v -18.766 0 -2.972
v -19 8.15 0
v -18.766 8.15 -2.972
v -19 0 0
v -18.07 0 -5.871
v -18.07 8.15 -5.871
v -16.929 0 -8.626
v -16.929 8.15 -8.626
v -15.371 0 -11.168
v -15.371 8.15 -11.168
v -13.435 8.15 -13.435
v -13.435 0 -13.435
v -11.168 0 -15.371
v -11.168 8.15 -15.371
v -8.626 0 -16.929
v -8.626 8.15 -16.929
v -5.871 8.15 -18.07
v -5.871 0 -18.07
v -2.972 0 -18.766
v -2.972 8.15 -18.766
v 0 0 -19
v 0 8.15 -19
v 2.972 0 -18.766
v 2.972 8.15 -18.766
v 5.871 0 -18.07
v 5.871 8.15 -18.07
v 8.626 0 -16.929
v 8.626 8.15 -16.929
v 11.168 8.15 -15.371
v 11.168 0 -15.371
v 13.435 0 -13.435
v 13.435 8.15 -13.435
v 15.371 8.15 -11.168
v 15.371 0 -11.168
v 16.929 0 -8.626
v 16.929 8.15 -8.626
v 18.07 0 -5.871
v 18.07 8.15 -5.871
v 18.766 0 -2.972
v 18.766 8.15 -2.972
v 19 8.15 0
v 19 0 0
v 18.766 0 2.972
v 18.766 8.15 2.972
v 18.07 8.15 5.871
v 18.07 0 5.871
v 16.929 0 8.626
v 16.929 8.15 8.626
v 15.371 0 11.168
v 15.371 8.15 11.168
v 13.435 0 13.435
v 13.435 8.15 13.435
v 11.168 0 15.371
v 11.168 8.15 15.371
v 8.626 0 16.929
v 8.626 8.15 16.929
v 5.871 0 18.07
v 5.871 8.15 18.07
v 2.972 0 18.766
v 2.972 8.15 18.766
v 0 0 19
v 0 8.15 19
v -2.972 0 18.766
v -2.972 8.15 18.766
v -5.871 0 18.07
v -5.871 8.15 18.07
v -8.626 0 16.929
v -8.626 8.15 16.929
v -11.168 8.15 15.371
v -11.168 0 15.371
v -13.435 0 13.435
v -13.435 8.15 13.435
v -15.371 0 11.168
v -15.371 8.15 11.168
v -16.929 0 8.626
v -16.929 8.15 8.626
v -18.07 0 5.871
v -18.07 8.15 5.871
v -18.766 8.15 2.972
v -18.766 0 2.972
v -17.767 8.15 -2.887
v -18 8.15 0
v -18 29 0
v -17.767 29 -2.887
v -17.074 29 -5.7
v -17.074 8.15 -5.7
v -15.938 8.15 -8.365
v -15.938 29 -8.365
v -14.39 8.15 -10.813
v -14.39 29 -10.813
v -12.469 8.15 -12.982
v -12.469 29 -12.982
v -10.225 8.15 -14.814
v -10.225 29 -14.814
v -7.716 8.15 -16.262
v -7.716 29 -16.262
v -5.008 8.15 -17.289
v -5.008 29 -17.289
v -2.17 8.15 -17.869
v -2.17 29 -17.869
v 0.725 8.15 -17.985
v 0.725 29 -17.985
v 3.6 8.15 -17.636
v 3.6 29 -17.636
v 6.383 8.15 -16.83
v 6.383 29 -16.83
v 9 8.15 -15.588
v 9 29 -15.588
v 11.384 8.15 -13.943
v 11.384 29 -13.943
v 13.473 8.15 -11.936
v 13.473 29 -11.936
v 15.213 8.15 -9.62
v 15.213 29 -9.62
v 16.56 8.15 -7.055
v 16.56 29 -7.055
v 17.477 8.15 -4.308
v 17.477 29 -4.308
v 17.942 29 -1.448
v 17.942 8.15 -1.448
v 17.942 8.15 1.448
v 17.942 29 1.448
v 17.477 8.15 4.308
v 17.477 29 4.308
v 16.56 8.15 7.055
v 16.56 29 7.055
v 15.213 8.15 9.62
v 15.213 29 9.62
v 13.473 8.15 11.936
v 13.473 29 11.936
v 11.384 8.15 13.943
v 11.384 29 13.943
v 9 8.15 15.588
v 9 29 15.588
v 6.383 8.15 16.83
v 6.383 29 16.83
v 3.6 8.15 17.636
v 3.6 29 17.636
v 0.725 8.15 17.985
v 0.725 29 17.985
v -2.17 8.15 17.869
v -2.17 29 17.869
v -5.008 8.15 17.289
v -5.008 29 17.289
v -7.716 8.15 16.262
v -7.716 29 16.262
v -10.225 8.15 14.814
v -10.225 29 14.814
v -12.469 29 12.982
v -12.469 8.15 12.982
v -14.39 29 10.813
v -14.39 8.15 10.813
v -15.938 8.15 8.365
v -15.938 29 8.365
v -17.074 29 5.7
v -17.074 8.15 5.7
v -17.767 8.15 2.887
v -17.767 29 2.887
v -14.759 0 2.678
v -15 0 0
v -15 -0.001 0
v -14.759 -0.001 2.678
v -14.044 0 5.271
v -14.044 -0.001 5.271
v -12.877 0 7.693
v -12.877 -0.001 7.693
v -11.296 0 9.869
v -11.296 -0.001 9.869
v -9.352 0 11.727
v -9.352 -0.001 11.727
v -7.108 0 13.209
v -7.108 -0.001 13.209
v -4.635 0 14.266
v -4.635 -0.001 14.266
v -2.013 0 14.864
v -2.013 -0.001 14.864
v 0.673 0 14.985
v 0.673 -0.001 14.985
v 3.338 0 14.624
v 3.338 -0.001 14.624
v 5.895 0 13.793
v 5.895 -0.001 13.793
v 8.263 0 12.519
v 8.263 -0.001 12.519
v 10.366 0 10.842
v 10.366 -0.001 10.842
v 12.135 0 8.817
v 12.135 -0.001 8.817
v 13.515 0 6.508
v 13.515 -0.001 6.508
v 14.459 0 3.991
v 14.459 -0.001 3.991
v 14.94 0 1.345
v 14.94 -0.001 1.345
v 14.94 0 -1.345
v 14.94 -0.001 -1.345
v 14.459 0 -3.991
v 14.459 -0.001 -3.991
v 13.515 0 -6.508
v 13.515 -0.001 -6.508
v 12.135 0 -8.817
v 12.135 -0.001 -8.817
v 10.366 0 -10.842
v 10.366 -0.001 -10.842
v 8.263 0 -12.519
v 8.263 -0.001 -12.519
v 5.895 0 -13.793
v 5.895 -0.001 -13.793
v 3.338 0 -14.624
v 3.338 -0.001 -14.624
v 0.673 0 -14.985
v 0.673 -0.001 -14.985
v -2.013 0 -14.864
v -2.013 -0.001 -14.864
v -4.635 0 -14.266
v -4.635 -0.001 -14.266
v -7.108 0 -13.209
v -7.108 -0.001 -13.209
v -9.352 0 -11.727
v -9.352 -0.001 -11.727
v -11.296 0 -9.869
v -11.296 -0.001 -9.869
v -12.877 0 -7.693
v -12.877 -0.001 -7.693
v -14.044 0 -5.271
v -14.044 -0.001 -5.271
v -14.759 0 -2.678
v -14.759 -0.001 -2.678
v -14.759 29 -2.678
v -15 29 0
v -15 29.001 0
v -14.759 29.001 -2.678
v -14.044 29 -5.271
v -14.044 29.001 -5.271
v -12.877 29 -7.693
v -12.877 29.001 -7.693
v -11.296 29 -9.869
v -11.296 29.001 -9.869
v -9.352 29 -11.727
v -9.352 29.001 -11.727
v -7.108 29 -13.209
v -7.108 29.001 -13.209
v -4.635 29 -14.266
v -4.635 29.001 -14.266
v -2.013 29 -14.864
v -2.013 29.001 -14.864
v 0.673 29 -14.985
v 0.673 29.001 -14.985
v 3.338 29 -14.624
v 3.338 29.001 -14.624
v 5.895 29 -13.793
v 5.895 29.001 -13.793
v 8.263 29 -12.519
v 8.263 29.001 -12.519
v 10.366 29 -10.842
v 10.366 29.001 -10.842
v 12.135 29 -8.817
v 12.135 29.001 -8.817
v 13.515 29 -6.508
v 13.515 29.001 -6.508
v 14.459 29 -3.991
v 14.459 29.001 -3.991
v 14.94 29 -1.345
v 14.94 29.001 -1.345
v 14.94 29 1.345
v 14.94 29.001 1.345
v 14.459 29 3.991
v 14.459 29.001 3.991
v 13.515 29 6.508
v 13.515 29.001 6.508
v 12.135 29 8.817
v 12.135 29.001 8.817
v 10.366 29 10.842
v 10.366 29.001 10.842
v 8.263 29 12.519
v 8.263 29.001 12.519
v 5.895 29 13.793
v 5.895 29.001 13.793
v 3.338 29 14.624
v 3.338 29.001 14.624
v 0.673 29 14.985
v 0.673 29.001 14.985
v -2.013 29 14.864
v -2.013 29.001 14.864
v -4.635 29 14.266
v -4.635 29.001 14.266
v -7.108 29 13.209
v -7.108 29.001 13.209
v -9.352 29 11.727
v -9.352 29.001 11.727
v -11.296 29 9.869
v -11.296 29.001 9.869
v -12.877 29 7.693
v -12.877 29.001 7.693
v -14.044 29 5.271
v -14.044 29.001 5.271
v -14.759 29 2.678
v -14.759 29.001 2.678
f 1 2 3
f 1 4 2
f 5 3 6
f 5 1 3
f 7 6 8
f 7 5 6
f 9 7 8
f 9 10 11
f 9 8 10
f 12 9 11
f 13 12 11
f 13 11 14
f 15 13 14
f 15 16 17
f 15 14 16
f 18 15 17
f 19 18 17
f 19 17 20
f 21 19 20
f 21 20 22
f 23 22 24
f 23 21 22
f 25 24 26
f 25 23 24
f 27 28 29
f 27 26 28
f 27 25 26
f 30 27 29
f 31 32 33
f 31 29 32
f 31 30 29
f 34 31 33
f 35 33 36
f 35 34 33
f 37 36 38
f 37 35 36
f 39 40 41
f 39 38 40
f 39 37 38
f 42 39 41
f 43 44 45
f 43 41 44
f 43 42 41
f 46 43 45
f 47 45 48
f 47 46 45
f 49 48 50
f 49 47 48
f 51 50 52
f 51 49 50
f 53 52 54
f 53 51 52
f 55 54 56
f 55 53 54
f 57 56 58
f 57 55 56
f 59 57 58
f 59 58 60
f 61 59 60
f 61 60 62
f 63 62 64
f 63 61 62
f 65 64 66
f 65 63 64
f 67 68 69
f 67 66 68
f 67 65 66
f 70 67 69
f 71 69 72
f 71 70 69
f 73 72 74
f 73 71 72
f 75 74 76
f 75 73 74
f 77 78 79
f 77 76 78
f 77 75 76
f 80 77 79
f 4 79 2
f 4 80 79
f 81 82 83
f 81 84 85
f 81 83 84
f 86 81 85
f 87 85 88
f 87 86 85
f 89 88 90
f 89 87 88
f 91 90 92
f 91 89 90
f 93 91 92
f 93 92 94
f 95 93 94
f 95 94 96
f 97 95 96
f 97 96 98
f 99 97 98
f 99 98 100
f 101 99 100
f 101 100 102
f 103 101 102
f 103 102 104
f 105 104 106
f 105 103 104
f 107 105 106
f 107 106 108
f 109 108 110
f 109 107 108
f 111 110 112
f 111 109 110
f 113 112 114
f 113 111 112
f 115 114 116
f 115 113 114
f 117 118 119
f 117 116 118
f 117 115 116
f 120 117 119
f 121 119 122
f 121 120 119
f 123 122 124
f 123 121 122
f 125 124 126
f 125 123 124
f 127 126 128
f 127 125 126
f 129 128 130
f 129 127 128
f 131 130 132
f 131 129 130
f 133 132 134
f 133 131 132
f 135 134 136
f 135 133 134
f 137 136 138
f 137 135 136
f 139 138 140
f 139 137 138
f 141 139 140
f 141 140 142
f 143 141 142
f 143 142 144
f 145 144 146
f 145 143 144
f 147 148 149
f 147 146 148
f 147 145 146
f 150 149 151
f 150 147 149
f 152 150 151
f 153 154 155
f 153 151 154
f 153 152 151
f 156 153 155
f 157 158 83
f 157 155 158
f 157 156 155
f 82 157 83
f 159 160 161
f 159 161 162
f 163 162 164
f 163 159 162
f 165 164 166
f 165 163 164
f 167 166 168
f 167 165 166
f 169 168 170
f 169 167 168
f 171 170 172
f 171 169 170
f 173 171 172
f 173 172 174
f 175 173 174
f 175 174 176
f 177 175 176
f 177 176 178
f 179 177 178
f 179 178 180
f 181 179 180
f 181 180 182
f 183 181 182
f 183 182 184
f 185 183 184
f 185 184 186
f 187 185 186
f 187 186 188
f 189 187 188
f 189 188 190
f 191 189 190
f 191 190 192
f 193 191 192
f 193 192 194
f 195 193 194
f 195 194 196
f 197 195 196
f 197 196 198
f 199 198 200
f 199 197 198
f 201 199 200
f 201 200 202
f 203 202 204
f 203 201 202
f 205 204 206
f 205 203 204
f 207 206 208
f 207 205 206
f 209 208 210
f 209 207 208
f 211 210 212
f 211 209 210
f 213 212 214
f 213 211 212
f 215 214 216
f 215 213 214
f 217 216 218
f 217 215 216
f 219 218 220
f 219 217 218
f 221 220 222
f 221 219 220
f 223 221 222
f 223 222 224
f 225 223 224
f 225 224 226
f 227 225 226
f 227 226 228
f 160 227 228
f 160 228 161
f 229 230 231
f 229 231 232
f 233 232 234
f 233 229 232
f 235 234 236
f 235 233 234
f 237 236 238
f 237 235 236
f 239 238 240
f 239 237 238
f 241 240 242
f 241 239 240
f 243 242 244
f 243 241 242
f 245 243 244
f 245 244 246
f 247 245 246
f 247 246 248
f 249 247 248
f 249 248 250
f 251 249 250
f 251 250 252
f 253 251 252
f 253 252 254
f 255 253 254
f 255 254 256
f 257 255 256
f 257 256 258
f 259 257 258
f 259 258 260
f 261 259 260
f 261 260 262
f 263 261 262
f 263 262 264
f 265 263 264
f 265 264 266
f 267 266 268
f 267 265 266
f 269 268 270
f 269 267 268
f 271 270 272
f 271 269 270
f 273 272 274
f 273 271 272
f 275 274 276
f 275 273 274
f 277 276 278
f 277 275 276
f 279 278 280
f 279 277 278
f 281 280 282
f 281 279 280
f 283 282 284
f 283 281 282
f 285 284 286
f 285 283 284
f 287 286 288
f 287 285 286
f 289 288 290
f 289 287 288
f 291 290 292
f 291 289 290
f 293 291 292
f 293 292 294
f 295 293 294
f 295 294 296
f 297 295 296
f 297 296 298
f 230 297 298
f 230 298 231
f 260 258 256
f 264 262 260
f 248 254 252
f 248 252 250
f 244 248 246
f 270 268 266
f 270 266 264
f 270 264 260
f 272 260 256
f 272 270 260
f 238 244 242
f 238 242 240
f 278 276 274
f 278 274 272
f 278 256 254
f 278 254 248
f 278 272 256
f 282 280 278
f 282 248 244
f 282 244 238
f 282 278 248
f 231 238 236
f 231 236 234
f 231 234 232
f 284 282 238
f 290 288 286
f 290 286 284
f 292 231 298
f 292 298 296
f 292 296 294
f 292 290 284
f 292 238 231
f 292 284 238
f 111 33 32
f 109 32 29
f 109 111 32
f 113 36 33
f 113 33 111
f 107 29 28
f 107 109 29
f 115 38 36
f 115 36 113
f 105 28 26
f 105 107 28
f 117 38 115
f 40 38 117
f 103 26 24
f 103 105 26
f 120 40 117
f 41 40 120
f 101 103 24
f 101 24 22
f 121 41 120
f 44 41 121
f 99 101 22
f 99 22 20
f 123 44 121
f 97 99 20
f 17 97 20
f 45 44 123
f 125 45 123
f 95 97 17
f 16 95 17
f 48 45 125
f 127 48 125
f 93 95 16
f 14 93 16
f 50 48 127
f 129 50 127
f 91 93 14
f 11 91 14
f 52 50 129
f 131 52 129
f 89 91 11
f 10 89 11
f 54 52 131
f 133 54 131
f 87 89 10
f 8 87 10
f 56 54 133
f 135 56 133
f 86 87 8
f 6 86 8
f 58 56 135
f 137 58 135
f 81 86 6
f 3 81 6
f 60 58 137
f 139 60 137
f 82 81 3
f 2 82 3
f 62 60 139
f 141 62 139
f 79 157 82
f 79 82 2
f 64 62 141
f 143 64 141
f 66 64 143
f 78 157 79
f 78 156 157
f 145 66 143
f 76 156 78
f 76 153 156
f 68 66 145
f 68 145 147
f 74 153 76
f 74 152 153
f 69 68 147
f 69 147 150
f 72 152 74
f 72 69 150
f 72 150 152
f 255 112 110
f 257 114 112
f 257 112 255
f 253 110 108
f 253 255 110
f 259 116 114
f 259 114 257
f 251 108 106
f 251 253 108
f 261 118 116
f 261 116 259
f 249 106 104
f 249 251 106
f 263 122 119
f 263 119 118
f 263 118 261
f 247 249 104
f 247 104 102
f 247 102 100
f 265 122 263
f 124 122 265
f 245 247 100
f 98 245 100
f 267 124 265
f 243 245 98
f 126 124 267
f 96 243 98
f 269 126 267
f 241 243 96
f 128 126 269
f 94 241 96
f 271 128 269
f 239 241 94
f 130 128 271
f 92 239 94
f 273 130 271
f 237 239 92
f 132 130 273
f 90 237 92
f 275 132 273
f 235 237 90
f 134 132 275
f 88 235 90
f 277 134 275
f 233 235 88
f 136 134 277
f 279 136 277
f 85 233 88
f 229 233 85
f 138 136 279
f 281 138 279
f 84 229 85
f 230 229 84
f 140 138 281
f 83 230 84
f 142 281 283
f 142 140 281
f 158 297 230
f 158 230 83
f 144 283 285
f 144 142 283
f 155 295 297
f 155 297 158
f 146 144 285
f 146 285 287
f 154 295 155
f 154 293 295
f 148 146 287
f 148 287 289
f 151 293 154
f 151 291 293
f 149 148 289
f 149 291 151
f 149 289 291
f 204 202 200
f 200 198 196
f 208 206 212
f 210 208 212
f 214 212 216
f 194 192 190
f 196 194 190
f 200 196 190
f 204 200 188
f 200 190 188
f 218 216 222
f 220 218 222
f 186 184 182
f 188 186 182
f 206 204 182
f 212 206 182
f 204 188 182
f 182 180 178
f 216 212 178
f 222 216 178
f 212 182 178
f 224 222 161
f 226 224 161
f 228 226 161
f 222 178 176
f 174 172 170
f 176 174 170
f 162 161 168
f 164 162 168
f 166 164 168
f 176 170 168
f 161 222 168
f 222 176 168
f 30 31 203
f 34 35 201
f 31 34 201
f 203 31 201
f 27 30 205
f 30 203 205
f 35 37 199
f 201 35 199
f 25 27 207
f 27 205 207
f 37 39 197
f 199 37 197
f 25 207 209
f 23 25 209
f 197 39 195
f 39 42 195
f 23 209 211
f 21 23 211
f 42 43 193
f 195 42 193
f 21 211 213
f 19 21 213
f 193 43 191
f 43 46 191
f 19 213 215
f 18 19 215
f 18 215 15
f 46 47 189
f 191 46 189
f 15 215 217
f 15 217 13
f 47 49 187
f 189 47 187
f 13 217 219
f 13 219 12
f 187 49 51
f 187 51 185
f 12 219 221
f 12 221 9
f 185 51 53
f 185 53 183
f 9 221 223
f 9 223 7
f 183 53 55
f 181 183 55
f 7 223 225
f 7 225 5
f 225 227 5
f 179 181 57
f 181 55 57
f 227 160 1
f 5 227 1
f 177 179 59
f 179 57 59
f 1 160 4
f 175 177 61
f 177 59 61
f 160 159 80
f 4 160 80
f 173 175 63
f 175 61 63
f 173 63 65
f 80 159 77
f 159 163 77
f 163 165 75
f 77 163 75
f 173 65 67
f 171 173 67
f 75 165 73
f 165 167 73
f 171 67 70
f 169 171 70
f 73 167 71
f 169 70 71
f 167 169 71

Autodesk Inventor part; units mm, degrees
ref_plane "YZ Plane" through (0, 0, 0) normal (1, 0, 0) x (0, 1, 0)
ref_plane "XZ Plane" through (0, 0, 0) normal (0, 1, 0) x (-1, 0, 0)
ref_plane "XY Plane" through (0, 0, 0) normal (0, 0, 1) x (1, 0, 0)
sketch "Sketch1" plane through (0, 0, 0) normal (0, 1, 0) x (-1, 0, 0)
  circle A0 centre (0, 0) radius 19
  circle A1 centre (0, 0) radius 18
  circle A2 centre (0, 0) radius 15
  dimension "d0" = 38
  dimension "d1" = 36
  dimension "d2" = 30
extrude "Extrusion1" add sketch "Sketch1" along normal blind 29 contours A1
extrude "Extrusion2" add sketch "Sketch1" along normal blind 8.15 contours A0
extrude "Extrusion3" add sketch "Sketch1" along normal blind 29.001 contours A2
extrude "Extrusion4" add sketch "Sketch1" against normal blind 0.001 contours A2
properties part number "NikkonTubelens"
